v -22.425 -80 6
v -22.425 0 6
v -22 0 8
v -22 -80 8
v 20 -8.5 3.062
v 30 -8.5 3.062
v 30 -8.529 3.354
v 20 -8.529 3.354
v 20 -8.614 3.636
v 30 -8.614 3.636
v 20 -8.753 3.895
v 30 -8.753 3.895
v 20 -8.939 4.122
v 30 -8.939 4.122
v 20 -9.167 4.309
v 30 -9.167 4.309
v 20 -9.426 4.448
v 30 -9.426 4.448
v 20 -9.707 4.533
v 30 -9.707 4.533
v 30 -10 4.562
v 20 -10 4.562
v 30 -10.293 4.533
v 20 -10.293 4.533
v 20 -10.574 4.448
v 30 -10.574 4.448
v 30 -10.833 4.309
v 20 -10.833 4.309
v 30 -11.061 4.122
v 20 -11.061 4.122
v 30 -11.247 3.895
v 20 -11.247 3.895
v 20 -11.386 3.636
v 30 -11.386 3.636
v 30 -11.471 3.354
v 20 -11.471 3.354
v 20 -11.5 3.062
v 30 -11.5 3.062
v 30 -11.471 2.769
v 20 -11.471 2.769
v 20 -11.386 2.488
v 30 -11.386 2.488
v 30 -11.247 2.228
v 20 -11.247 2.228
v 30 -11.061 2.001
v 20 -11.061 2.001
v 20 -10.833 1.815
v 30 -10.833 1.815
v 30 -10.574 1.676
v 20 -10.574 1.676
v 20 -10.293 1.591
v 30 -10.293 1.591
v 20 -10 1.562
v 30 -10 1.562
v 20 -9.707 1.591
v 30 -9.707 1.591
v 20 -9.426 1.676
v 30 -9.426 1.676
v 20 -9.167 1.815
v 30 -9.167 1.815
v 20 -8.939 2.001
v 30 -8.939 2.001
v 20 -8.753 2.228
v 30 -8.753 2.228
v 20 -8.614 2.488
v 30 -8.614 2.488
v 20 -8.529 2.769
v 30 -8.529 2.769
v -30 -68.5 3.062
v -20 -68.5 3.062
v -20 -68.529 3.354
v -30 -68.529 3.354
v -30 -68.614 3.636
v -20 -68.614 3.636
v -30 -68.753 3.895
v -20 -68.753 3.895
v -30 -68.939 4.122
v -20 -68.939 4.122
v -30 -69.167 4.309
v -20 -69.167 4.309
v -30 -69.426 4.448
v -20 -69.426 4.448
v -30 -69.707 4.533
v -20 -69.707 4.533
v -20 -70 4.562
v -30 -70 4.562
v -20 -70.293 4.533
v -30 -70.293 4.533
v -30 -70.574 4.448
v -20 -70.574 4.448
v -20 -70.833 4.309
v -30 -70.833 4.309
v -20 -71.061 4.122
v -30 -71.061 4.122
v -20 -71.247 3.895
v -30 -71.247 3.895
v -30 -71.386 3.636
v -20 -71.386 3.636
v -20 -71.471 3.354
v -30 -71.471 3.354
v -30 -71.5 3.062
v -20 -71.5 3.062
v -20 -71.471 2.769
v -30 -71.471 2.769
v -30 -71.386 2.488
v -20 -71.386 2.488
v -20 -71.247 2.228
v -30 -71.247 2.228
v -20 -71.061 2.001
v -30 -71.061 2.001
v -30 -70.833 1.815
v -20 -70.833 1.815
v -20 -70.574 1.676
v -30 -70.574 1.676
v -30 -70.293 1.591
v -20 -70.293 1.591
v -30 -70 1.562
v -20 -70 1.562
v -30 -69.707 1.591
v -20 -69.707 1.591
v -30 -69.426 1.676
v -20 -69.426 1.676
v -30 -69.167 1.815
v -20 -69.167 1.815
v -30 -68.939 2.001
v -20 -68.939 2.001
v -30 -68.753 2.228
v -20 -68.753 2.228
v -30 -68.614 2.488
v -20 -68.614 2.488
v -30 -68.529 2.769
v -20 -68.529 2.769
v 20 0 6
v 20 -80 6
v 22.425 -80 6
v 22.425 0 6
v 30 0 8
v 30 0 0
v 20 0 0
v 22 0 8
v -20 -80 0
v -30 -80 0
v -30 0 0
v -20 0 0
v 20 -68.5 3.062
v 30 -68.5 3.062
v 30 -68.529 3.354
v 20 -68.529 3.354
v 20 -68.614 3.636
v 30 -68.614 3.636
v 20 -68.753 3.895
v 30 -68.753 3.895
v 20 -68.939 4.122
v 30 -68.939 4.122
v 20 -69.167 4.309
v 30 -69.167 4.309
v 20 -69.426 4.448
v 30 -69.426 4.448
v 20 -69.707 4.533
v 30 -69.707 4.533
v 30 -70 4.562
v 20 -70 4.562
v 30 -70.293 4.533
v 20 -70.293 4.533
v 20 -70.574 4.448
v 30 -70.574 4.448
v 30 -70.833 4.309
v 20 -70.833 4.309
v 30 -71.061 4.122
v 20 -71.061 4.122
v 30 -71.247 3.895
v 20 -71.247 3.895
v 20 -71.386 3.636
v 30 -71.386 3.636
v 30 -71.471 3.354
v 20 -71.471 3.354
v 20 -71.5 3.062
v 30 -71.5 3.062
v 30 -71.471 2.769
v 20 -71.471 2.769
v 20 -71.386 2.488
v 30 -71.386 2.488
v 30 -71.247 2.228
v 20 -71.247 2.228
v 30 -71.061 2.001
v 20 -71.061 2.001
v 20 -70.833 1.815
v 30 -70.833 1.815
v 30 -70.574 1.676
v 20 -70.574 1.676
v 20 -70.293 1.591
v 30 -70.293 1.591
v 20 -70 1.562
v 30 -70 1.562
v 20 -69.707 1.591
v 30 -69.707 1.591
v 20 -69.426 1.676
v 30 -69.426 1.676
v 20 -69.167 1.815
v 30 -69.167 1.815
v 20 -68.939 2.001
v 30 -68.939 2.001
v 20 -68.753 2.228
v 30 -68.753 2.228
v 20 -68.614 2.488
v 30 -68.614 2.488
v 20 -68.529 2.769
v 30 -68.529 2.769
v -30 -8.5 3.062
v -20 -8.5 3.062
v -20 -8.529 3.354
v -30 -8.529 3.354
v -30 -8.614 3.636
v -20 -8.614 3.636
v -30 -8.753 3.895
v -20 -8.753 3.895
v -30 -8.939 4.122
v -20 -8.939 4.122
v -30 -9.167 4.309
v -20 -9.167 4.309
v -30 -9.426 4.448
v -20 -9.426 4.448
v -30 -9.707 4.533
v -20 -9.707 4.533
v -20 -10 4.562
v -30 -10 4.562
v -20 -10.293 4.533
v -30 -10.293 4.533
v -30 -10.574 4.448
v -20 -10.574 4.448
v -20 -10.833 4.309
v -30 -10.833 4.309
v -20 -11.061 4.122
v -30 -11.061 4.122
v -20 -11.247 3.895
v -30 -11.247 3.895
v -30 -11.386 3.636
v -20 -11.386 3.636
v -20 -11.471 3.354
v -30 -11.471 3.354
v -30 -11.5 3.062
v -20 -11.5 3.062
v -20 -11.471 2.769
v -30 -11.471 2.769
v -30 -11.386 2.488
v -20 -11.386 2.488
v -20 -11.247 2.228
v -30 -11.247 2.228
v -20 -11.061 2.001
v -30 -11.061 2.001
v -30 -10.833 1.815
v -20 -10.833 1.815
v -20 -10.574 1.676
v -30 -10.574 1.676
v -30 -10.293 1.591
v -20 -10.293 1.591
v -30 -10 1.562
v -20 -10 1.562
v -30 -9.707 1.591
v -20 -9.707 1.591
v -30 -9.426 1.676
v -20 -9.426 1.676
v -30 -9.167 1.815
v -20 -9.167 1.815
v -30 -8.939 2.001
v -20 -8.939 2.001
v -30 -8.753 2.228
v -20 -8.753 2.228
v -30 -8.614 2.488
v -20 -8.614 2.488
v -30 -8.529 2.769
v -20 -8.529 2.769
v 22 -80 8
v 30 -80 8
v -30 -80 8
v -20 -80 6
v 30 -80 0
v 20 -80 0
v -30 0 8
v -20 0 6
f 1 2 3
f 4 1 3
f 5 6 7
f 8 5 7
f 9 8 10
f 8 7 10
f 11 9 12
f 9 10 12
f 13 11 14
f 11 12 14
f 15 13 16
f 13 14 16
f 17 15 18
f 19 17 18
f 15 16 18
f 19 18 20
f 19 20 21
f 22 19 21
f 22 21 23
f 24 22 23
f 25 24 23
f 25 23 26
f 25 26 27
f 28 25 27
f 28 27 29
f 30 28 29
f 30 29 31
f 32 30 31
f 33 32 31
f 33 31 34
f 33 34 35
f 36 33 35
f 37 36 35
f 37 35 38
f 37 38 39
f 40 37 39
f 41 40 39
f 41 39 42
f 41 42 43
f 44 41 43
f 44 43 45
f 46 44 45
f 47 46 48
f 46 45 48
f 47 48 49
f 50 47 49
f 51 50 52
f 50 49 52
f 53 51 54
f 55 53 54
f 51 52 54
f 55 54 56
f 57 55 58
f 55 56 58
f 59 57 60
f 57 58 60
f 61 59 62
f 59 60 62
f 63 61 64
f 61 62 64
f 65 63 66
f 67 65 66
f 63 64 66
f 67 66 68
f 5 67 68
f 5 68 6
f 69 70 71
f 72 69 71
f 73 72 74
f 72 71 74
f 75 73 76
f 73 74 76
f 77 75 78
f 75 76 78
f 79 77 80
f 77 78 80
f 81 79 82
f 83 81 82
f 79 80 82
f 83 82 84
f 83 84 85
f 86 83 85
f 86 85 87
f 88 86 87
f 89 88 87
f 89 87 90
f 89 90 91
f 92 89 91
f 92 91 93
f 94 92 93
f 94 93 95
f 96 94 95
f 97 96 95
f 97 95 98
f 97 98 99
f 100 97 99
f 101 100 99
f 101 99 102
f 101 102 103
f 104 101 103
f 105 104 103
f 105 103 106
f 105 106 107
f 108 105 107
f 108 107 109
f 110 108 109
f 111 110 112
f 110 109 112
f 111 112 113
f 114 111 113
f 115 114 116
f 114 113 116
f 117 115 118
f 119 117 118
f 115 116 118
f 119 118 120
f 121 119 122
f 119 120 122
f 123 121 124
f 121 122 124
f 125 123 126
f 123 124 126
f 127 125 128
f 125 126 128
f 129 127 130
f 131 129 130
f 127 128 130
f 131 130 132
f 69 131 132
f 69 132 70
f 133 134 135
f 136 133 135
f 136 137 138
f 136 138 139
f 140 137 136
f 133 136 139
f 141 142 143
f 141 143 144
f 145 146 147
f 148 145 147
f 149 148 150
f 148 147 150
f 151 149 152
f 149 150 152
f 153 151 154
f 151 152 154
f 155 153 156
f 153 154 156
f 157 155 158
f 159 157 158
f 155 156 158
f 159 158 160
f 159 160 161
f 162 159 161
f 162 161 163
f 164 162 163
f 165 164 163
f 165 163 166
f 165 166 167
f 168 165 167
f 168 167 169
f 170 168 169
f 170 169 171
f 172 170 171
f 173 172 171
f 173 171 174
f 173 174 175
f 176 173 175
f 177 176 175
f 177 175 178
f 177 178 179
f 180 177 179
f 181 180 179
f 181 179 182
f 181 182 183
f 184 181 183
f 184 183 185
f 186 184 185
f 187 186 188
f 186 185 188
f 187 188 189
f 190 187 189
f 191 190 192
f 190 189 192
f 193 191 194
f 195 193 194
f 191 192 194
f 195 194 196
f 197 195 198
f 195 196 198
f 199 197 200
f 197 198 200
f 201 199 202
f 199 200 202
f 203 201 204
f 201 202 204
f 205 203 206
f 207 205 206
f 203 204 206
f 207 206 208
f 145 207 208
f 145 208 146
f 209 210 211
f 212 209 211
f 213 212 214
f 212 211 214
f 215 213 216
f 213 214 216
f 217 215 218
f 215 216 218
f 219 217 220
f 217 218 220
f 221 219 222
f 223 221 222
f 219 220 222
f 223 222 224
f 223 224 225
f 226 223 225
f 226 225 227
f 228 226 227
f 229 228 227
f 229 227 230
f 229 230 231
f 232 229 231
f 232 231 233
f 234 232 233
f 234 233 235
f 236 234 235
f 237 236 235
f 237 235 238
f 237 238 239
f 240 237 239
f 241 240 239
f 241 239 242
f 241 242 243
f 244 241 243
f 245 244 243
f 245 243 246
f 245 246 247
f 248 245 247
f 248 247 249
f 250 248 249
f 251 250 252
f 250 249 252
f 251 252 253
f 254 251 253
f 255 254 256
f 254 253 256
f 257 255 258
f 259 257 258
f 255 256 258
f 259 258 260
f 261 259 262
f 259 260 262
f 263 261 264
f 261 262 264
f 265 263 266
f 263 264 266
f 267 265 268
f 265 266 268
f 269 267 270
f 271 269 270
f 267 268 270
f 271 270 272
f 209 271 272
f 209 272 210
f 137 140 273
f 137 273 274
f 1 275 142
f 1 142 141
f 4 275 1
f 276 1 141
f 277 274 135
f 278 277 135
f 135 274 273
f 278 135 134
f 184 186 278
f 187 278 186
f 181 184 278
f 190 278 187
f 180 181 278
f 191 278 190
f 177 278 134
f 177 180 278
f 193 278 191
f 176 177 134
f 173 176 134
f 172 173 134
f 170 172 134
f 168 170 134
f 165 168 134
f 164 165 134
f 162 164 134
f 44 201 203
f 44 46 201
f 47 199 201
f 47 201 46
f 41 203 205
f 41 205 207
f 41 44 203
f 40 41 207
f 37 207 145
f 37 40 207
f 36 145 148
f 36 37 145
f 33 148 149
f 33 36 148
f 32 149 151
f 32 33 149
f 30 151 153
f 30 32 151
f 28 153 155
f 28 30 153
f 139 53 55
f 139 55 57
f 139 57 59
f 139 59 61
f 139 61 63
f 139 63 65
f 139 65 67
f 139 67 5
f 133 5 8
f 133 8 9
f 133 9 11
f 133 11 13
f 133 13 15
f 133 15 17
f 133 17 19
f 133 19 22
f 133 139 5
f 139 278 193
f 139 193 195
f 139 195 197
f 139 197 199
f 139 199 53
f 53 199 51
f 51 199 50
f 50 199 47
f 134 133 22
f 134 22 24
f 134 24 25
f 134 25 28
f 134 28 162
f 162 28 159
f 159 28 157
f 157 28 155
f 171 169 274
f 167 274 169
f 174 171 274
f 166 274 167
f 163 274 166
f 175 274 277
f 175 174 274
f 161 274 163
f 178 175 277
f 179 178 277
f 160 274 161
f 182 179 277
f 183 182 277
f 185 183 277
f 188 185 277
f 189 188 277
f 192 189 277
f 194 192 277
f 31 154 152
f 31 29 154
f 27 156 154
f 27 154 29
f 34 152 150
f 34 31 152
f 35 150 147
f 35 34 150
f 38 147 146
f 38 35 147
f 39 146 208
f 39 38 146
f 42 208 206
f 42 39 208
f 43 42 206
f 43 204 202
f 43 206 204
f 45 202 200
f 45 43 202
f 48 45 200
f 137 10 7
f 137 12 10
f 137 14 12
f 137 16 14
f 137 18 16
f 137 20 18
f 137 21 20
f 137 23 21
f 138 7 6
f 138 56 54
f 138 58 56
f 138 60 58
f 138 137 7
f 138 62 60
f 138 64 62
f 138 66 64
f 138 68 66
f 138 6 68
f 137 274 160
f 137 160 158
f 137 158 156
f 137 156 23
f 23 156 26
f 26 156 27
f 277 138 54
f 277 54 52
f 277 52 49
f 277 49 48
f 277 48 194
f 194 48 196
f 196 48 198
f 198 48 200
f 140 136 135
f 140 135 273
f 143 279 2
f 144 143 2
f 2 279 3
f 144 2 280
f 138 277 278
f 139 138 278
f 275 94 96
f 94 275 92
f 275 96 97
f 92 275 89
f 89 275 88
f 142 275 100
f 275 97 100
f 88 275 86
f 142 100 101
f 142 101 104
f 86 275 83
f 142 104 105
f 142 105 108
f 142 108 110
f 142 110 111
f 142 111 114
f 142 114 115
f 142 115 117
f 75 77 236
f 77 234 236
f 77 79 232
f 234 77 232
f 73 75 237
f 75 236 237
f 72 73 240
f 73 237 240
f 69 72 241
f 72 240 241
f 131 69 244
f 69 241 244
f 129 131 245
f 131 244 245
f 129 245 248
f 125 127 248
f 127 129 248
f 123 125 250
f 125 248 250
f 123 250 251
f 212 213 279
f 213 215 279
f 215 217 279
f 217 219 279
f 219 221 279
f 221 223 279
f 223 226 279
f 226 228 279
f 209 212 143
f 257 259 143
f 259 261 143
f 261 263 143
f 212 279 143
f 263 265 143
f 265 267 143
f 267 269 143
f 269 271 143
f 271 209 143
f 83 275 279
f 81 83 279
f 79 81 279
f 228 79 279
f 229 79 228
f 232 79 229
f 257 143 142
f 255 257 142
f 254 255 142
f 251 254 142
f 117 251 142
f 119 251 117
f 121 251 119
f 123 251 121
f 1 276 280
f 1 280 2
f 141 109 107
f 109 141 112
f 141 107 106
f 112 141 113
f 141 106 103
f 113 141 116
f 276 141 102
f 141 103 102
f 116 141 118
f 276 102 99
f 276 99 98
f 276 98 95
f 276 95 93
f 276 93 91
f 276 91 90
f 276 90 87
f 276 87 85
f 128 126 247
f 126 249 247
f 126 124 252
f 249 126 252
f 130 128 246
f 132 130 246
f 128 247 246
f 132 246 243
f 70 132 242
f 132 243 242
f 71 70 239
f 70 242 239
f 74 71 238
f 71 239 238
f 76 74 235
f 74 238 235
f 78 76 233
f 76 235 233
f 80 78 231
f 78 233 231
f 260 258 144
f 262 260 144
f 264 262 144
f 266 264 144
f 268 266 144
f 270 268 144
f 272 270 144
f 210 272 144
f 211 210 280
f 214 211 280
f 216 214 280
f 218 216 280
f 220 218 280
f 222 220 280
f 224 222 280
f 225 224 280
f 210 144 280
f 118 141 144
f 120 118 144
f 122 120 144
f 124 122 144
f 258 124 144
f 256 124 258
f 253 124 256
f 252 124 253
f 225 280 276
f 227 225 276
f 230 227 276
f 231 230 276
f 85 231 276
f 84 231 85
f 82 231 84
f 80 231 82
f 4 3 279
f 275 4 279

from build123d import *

# Parameters (mm, degrees)
F1_DEPTH = 80
F3_R     = 1.5
F4_DEPTH = 70


with BuildPart() as f1:
    # F0 (on Front) → F1 (new body)
    with BuildSketch(Plane.XZ):
        Polygon((-22, 8), (-30, 8), (-30, 0), (-20, 0), (-20, 6), (-22.425113, 6), align=None)
    extrude(amount=F1_DEPTH)


with BuildPart() as f2_1:
    # F2: instance of F1
    add(f1.part.mirror(Plane.YZ))


with BuildPart() as f4_tool:
    # F3 (on face) → F4 (new body)
    with BuildSketch(Plane.YZ.offset(30)):
        with Locations((-70, 3.061812)):
            Circle(F3_R)
        with Locations((-10, 3.061812)):
            Circle(F3_R)
    extrude(amount=-F4_DEPTH)


with BuildPart() as f1_1:
    add(f1.part)

    # F4: cut by f4_tool
    add(f4_tool.part, mode=Mode.SUBTRACT)


with BuildPart() as f2_1_1:
    add(f2_1.part)

    # F4: cut by f4_tool
    add(f4_tool.part, mode=Mode.SUBTRACT)


solid = Compound([f1_1.part, f2_1_1.part])
